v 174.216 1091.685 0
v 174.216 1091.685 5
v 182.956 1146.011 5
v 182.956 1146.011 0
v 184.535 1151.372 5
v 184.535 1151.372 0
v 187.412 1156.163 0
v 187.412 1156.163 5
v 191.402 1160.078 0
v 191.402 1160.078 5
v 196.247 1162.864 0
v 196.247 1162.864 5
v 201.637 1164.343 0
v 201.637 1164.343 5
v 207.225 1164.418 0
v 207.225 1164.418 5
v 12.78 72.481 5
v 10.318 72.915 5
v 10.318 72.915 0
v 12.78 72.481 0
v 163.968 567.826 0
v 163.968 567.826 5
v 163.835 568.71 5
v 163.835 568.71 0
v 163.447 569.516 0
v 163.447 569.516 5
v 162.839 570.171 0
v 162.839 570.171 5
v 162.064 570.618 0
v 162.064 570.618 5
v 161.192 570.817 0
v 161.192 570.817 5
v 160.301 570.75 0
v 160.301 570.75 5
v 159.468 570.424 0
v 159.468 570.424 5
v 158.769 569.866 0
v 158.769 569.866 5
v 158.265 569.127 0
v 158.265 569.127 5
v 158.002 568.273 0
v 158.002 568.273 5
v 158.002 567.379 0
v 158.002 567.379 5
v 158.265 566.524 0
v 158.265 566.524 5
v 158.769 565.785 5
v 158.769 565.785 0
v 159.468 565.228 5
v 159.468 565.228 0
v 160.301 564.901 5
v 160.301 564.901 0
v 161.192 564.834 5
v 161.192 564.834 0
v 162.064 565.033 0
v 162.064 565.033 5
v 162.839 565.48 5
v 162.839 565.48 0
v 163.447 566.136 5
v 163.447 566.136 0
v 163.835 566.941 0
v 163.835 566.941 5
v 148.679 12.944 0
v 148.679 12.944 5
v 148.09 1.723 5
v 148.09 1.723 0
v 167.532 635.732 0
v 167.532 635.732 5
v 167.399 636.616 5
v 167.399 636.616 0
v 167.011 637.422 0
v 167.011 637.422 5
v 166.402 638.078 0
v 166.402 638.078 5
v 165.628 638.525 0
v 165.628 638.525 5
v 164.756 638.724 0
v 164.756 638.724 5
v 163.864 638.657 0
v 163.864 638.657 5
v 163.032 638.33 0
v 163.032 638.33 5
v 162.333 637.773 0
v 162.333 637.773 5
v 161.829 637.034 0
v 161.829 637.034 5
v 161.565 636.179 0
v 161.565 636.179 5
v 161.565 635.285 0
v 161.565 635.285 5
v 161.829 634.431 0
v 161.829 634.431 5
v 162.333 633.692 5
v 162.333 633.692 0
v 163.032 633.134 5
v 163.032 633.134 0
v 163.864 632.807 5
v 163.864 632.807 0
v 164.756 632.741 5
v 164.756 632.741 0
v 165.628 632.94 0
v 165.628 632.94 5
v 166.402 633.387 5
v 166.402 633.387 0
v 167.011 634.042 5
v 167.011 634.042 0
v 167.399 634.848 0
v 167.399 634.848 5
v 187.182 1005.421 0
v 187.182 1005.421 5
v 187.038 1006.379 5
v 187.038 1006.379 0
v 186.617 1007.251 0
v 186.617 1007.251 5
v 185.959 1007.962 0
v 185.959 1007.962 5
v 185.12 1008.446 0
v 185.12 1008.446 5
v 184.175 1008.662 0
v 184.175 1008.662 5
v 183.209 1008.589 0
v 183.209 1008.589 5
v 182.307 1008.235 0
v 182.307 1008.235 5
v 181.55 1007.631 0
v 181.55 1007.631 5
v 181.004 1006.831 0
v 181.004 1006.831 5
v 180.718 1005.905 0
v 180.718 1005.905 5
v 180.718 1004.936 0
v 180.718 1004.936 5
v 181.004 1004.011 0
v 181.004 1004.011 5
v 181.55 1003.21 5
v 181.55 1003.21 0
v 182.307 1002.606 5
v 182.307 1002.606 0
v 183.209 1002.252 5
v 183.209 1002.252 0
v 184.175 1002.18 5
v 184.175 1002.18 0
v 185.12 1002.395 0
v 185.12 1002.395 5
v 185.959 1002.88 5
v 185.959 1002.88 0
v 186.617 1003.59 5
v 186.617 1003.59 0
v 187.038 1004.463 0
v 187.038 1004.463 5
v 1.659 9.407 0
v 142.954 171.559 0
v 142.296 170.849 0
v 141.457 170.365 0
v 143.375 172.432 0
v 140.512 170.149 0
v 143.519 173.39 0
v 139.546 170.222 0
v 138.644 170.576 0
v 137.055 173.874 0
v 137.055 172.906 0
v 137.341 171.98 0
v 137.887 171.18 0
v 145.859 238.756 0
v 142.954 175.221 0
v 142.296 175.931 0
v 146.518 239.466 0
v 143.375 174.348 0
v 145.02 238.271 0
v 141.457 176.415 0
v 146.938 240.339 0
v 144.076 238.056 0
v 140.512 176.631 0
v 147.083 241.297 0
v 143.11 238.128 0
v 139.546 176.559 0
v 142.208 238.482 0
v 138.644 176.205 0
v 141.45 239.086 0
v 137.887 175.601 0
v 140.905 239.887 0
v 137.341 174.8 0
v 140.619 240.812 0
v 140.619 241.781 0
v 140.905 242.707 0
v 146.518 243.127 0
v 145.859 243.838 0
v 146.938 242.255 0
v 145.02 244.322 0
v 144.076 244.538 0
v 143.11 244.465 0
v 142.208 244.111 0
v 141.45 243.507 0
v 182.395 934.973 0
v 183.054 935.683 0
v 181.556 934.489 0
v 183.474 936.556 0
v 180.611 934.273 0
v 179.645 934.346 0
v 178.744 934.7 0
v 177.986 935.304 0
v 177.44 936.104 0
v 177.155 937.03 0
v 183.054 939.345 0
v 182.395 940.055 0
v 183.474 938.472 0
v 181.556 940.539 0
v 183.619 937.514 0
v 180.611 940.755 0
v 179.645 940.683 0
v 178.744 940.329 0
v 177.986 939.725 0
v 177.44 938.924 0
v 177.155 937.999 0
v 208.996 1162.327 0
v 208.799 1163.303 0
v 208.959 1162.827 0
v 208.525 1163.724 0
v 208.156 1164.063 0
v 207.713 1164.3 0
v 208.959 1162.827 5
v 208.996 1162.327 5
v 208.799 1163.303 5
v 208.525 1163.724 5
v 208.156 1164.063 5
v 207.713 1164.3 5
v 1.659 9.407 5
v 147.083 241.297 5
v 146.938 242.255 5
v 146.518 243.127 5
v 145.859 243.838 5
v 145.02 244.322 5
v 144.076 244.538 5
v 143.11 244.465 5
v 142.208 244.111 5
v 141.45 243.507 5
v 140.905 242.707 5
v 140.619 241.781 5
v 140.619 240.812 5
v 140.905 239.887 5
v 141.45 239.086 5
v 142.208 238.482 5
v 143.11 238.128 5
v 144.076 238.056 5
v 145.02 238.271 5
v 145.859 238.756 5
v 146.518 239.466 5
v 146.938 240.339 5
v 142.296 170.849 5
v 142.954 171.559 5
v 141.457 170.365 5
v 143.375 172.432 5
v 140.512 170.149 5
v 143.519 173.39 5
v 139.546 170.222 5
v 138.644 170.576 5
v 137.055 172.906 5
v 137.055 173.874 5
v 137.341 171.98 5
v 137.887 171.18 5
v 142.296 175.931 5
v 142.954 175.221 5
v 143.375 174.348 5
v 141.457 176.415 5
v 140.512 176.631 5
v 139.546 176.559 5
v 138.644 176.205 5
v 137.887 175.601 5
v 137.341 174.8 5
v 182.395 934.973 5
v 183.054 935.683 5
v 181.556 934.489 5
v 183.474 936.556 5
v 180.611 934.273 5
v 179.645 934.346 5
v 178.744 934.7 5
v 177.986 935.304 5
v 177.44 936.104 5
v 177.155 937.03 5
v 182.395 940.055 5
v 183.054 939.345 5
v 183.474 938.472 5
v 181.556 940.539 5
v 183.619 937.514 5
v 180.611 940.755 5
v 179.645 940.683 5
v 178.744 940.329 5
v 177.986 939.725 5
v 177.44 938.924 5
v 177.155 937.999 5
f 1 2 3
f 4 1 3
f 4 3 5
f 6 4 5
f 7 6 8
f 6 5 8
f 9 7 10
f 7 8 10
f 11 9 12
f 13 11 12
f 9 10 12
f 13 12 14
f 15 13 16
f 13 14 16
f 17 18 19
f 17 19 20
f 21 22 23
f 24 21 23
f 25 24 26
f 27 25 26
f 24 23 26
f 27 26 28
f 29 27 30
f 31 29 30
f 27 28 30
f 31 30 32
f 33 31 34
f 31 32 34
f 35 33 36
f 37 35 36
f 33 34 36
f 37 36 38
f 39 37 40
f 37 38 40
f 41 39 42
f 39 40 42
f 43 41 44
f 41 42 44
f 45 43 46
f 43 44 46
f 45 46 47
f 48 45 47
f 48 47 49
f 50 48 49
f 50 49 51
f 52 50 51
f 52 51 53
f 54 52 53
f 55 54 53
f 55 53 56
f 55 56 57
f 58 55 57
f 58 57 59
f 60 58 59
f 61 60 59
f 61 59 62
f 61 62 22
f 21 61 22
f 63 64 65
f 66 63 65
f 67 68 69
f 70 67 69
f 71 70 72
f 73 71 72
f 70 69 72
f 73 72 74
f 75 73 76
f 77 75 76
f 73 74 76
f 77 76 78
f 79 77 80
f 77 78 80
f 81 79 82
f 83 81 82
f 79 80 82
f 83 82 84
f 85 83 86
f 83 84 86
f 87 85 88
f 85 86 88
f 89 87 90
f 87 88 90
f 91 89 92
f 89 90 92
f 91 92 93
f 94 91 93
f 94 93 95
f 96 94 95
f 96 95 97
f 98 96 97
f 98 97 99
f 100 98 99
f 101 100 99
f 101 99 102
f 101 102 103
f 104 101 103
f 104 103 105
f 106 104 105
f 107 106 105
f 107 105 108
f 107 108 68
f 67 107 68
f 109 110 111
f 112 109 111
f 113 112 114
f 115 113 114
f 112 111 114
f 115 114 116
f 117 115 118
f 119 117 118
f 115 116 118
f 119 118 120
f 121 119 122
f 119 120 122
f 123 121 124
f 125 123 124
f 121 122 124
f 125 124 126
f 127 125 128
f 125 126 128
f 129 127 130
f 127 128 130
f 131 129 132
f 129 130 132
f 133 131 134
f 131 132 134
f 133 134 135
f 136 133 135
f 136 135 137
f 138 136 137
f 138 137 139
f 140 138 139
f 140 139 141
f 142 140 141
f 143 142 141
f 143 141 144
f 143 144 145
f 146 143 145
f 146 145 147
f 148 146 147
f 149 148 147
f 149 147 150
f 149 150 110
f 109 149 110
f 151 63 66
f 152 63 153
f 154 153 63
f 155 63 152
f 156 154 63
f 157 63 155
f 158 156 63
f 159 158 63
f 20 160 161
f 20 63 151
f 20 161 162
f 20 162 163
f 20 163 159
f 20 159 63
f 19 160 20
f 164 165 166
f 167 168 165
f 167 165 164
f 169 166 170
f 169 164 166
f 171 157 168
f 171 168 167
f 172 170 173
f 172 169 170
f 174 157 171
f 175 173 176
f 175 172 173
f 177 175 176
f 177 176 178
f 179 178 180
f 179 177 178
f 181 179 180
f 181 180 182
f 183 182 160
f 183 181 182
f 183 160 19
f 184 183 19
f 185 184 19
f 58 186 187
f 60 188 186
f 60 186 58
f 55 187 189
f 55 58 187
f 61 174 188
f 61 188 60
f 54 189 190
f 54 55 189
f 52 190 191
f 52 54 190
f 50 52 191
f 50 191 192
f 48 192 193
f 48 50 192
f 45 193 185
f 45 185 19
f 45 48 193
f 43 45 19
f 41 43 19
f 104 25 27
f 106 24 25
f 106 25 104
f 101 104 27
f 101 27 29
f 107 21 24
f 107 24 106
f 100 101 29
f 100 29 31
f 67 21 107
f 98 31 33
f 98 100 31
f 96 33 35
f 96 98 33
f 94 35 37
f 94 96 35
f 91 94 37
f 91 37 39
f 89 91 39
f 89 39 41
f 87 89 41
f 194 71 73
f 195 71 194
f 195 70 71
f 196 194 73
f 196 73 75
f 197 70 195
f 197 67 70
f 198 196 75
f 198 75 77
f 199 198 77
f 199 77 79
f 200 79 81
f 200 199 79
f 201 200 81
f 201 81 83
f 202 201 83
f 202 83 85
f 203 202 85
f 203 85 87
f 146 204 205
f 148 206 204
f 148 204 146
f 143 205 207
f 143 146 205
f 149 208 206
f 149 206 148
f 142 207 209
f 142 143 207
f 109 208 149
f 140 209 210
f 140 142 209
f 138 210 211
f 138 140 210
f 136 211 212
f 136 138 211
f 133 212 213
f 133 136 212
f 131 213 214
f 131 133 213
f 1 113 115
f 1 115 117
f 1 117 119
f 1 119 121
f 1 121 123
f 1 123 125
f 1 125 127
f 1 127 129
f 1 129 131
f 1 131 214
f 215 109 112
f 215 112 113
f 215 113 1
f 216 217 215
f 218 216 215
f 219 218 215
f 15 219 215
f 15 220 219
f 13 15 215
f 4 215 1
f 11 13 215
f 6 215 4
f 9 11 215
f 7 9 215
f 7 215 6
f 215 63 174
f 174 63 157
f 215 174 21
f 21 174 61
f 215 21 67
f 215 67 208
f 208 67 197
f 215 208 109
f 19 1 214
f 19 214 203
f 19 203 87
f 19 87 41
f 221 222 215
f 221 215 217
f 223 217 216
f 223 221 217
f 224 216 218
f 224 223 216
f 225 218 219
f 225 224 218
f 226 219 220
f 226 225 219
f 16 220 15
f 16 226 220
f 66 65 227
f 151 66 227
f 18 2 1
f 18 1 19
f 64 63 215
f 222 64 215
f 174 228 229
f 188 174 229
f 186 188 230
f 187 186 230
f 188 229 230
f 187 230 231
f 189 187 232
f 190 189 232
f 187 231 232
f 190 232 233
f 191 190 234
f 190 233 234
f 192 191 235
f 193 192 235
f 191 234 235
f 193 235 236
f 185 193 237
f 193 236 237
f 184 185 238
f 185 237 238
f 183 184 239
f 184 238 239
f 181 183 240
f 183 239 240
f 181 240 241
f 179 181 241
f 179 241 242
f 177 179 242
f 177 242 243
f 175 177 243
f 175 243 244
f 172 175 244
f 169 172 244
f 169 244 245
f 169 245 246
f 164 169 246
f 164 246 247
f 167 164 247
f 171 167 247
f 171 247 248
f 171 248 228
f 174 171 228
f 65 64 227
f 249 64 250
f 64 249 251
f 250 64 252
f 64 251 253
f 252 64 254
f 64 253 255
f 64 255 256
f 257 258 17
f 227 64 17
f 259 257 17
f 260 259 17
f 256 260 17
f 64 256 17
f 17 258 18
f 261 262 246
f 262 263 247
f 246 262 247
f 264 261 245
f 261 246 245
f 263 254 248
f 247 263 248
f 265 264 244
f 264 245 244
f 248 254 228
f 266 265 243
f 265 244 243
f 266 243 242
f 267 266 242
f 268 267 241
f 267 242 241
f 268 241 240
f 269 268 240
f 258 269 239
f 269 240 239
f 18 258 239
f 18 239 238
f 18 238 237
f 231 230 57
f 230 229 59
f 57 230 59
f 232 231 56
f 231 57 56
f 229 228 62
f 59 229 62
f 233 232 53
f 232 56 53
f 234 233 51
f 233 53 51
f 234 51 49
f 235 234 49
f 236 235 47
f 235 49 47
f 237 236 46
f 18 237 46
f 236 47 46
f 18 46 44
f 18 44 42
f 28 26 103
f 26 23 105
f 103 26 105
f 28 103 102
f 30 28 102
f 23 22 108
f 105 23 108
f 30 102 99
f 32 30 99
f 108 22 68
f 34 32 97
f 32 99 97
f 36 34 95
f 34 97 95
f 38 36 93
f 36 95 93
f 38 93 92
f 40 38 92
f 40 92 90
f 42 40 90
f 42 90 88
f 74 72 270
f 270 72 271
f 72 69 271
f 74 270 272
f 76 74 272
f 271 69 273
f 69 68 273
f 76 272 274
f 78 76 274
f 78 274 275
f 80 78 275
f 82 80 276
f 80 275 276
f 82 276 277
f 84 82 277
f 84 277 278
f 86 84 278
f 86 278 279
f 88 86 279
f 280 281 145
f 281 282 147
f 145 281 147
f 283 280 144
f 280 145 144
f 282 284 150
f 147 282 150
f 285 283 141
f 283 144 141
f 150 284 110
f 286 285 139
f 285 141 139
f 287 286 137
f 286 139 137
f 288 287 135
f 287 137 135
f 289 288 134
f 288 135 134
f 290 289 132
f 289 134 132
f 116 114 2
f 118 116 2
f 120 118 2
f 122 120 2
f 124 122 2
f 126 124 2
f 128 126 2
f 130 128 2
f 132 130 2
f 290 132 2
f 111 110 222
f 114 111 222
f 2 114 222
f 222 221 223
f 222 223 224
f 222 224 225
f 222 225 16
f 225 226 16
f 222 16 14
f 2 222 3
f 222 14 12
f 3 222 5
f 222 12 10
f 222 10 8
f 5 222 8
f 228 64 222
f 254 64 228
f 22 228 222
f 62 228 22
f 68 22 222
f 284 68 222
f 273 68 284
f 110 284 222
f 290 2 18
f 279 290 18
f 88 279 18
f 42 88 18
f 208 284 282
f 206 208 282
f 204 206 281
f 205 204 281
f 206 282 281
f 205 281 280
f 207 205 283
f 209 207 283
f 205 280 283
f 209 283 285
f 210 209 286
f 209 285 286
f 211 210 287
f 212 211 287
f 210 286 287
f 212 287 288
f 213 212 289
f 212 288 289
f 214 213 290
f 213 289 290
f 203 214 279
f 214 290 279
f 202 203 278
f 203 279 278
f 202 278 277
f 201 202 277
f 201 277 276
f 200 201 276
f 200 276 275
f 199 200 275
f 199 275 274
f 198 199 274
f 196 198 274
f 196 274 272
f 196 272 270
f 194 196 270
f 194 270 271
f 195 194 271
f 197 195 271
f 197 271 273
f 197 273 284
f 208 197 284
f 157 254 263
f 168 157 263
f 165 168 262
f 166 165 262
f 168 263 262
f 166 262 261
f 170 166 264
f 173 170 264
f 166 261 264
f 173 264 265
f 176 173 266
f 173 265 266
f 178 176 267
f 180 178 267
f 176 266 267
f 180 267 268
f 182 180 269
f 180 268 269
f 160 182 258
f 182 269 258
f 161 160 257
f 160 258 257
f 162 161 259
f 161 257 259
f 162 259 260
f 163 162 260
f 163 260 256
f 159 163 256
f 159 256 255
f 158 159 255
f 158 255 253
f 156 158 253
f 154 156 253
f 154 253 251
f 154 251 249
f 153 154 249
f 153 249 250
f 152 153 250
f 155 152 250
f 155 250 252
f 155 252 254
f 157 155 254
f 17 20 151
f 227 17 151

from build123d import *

# Parameters (mm, degrees)
BOSS_EXTRUDE1_DEPTH = 5
FILLET1_R           = 2
BOSS_EXTRUDE2_DEPTH = 5
BOSS_EXTRUDE3_DEPTH = 5
BOSS_EXTRUDE4_DEPTH = 5
CUT_EXTRUDE1_DEPTH  = 1184.176367894
SKETCH6_R           = 3.25
CUT_EXTRUDE2_DEPTH  = 1184.176367894
BOSS_EXTRUDE5_DEPTH = 5
CUT_EXTRUDE3_DEPTH  = 1184.176367894
SKETCH9_R           = 3
CUT_EXTRUDE4_DEPTH  = 1184.176367894


with BuildPart() as part:
    # Sketch1 → Boss-Extrude1 (new body)
    with BuildSketch(Plane.XY):
        Polygon((0, 0), (148, 0), (210.710741947, 1195), align=None)
    extrude(amount=BOSS_EXTRUDE1_DEPTH)

    # Fillet1
    fillet1_edges = [part.edges().sort_by_distance(p)[0] for p in [
        (210.710741947, 1195, 2.5),
    ]]
    fillet(fillet1_edges, radius=FILLET1_R)

    # Sketch2 → Boss-Extrude2 (add)
    with BuildSketch(Plane.XY.offset(5)):
        Polygon((191.942300905, 1088.558881537), (174.215761351, 1091.684548735), (10.318366476, 72.915290412), (12.780385859, 72.481169967), align=None)
    extrude(amount=-BOSS_EXTRUDE2_DEPTH)

    # Sketch3 → Boss-Extrude3 (add)
    with BuildSketch(Plane.XY.offset(5)):
        with BuildLine():
            Line((174.215761351, 1091.684548735), (182.955612005, 1146.010556635))
            ThreePointArc((182.955612005, 1146.010556635), (191.401570157, 1160.078122114), (207.225341391, 1164.418499006))
            ThreePointArc((207.225341391, 1164.418499006), (205.802244472, 1164.033891637), (205.029250268, 1162.778659534))
            Line((205.029250268, 1162.778659534), (191.942300905, 1088.558881537))
            Line((191.942300905, 1088.558881537), (174.215761351, 1091.684548735))
        make_face()
    extrude(amount=-BOSS_EXTRUDE3_DEPTH)

    # Sketch4 → Boss-Extrude4 (add)
    with BuildSketch(Plane.XY.offset(5)):
        Polygon((0, 0), (2.112629849, 11.981319257), (148.088309576, 1.682804887), (148, 0), align=None)
    extrude(amount=-BOSS_EXTRUDE4_DEPTH)

    # Sketch5 → Cut-Extrude1 (cut, through all)
    with BuildSketch(Plane.XY.offset(5)):
        Polygon((148.679280264, 12.9441925), (0.545384836, 3.093031107), (0, 0), (148, 0), align=None)
    extrude(amount=-CUT_EXTRUDE1_DEPTH, mode=Mode.SUBTRACT)

    # Sketch6 → Cut-Extrude2 (cut, through all)
    with BuildSketch(Plane.XY.offset(5)):
        with Locations((180.368599434, 937.514146328)):
            Circle(SKETCH6_R)
        with Locations((183.932173312, 1005.420706697)):
            Circle(SKETCH6_R)
        with Locations((143.832770259, 241.296648182)):
            Circle(SKETCH6_R)
        with Locations((140.269196381, 173.390087812)):
            Circle(SKETCH6_R)
    extrude(amount=-CUT_EXTRUDE2_DEPTH, mode=Mode.SUBTRACT)

    # Sketch7 → Boss-Extrude5 (add)
    with BuildSketch(Plane.XY.offset(5)):
        Polygon((148.679280264, 12.9441925), (148.090399515, 1.722630236), (54.104333141, 6.654794215), align=None)
    extrude(amount=-BOSS_EXTRUDE5_DEPTH)

    # Sketch8 → Cut-Extrude3 (cut, through all)
    with BuildSketch(Plane.XY.offset(5)):
        Polygon((54.104333141, 6.654794215), (1.658710562, 9.407015055), (0.545384836, 3.093031107), align=None)
    extrude(amount=-CUT_EXTRUDE3_DEPTH, mode=Mode.SUBTRACT)

    # Sketch9 → Cut-Extrude4 (cut, through all)
    with BuildSketch(Plane.XY.offset(5)):
        with Locations((160.968231329, 567.825650117)):
            Circle(SKETCH9_R)
        with Locations((164.531805206, 635.732210487)):
            Circle(SKETCH9_R)
    extrude(amount=-CUT_EXTRUDE4_DEPTH, mode=Mode.SUBTRACT)


solid = part.part
